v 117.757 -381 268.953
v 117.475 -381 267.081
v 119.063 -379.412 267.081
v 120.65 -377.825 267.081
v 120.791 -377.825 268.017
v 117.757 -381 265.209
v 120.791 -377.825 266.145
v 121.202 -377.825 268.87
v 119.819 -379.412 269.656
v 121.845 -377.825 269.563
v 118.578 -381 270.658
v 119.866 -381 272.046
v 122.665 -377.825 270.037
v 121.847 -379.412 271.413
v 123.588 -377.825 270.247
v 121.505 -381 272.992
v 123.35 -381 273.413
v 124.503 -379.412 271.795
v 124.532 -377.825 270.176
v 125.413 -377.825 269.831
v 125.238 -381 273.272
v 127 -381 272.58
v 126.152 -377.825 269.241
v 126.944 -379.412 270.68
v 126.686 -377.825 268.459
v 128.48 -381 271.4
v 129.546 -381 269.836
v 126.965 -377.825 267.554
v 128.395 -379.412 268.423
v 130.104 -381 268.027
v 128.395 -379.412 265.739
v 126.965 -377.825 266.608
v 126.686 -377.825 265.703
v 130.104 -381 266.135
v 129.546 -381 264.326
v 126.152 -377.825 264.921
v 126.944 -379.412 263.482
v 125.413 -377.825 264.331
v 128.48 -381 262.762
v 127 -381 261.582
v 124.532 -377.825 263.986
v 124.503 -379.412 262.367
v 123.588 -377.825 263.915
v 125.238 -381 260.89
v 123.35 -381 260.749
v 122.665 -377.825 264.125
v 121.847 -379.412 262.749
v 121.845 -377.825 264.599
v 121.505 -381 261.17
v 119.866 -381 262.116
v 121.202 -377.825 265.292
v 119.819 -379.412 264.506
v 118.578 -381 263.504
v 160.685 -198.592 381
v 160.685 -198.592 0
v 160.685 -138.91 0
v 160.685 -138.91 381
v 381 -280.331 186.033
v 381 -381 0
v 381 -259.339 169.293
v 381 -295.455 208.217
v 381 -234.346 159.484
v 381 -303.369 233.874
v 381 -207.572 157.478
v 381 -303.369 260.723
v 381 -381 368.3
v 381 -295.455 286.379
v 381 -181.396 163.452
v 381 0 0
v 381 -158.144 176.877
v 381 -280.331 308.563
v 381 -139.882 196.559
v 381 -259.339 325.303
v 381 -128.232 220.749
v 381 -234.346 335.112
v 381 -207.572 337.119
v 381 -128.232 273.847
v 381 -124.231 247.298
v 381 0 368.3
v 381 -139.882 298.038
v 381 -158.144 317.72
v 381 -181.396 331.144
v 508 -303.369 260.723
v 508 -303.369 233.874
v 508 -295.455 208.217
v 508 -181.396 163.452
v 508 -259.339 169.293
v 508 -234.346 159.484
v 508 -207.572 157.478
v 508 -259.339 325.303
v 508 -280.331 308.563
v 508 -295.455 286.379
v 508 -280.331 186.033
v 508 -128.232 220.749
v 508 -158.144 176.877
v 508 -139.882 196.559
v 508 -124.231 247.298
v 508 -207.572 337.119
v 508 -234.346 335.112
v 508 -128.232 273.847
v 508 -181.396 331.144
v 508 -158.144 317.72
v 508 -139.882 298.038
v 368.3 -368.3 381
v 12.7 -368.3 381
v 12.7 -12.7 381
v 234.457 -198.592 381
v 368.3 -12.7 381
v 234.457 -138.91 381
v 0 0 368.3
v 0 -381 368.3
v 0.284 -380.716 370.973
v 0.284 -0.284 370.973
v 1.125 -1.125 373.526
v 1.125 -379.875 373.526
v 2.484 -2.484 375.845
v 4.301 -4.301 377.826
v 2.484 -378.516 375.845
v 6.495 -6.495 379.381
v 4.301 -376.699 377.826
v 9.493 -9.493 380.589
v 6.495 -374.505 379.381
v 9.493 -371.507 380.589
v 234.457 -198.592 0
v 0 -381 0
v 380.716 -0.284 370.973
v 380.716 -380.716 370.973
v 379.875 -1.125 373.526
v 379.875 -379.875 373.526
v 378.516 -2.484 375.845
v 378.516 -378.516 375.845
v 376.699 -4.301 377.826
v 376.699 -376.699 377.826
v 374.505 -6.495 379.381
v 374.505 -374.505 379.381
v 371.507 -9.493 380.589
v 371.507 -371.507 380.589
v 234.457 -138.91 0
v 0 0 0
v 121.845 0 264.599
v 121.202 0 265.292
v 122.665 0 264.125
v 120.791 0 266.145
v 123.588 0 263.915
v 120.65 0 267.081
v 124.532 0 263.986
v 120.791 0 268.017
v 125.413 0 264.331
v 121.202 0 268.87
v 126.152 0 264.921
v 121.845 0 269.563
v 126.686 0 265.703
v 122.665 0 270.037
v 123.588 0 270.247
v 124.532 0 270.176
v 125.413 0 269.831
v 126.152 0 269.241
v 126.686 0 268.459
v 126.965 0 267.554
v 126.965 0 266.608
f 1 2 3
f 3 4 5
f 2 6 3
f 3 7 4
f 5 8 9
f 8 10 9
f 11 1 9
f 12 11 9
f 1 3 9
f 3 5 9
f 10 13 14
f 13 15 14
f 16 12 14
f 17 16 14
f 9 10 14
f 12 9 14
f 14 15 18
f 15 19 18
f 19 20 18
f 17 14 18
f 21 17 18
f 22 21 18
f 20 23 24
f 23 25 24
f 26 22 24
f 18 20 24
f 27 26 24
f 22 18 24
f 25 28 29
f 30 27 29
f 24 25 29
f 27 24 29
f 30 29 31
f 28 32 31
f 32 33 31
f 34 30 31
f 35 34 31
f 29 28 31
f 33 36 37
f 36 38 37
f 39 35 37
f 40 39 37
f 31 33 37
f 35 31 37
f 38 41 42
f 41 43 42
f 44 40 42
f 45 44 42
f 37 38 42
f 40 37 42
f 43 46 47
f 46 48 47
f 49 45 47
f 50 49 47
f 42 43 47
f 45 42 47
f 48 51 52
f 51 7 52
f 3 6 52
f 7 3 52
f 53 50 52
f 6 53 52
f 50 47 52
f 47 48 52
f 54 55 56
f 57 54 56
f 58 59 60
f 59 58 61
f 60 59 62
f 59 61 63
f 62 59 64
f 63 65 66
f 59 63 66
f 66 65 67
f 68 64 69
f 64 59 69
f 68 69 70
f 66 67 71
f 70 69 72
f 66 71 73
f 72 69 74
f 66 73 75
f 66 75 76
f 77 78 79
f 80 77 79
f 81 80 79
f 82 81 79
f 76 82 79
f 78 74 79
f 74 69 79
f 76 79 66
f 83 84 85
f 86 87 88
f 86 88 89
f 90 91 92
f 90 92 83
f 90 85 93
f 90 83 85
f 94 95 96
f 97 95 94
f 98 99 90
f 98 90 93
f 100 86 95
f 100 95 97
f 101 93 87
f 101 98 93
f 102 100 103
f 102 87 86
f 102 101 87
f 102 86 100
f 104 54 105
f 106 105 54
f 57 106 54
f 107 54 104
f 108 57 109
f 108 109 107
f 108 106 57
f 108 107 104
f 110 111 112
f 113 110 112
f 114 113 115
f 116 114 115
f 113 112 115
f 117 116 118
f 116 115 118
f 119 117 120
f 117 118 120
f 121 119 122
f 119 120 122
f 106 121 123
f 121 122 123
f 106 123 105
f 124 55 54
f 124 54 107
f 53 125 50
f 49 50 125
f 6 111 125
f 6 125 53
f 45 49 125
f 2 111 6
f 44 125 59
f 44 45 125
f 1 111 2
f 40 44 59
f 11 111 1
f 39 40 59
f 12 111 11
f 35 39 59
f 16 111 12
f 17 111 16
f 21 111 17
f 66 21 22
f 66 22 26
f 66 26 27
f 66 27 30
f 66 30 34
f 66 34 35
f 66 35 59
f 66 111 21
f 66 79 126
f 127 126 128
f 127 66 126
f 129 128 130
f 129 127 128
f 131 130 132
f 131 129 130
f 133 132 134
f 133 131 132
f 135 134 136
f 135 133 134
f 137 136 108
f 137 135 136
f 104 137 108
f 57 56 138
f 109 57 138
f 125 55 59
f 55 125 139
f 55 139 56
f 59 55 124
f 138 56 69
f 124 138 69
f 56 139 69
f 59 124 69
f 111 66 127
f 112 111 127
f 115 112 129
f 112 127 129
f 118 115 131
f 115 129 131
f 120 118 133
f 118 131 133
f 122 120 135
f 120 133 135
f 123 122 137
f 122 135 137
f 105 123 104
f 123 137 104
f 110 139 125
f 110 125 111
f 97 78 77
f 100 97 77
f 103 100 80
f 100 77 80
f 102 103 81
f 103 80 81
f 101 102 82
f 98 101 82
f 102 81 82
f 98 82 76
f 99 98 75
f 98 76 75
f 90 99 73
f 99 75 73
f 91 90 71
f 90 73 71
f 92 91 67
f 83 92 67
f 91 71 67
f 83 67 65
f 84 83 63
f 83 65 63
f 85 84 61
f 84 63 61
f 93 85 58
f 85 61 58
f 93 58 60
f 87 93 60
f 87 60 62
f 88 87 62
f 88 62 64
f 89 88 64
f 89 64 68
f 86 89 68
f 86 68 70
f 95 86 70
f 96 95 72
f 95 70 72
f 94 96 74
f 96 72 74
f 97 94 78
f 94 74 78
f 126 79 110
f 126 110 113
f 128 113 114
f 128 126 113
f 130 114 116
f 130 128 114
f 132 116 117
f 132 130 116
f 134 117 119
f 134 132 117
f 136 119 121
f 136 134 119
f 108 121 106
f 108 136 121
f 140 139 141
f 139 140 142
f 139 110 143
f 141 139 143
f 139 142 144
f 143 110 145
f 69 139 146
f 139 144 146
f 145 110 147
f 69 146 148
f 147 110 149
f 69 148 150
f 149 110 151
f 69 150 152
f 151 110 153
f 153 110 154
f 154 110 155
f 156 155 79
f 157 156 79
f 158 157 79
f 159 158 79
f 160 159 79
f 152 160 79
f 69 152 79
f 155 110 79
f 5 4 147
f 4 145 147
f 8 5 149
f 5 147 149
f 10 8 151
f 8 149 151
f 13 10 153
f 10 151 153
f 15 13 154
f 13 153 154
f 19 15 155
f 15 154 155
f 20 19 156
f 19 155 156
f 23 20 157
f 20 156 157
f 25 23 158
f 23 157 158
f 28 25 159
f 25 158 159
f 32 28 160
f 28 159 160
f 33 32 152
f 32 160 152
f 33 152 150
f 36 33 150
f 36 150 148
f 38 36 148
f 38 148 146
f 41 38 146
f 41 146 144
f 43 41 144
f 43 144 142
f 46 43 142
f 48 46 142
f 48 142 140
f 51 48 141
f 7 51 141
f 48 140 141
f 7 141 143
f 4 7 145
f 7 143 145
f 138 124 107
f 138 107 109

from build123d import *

# Parameters (mm, degrees)
F0_W           = 381
F0_H           = 381
F1_DEPTH       = 381
F3_D           = 6.35
F3_CSINK_D     = 12.7
F3_CSINK_ANGLE = 90
F4_R           = 12.7
F5_R           = 90.072303
F6_DEPTH       = 127
F7_W           = 73.772475
F7_H           = 59.68143
F8_DEPTH       = 508


with BuildPart() as f1:
    # F0 (on Front) → F1 (new body)
    with BuildSketch(Plane.XZ):
        with Locations((190.5, 190.5)):
            Rectangle(F0_W, F0_H)
    extrude(amount=F1_DEPTH)

    # F3 (through all)
    with Locations(Plane.XZ.offset(381)):
        with Locations((123.825006, 267.081022)):
            CounterSinkHole(F3_D / 2, F3_CSINK_D / 2, counter_sink_angle=F3_CSINK_ANGLE)

    # F4
    f4_edges = [f1.edges().sort_by_distance(p)[0] for p in [
        (381, -190.5, 381),
        (0, -190.5, 381),
        (190.5, 0, 381),
        (190.5, -381, 381),
    ]]
    fillet(f4_edges, radius=F4_R)

    # F5 (on face) → F6 (join)
    with BuildSketch(Plane.YZ.offset(381)):
        with Locations((-214.303002, 247.298166)):
            Circle(F5_R)
    extrude(amount=F6_DEPTH)

    # F7 (on face) → F8 (cut)
    with BuildSketch(Plane.XY.offset(381)):
        with Locations((197.570882, -168.751098)):
            Rectangle(F7_W, F7_H)
    extrude(amount=-F8_DEPTH, mode=Mode.SUBTRACT)


solid = f1.part
